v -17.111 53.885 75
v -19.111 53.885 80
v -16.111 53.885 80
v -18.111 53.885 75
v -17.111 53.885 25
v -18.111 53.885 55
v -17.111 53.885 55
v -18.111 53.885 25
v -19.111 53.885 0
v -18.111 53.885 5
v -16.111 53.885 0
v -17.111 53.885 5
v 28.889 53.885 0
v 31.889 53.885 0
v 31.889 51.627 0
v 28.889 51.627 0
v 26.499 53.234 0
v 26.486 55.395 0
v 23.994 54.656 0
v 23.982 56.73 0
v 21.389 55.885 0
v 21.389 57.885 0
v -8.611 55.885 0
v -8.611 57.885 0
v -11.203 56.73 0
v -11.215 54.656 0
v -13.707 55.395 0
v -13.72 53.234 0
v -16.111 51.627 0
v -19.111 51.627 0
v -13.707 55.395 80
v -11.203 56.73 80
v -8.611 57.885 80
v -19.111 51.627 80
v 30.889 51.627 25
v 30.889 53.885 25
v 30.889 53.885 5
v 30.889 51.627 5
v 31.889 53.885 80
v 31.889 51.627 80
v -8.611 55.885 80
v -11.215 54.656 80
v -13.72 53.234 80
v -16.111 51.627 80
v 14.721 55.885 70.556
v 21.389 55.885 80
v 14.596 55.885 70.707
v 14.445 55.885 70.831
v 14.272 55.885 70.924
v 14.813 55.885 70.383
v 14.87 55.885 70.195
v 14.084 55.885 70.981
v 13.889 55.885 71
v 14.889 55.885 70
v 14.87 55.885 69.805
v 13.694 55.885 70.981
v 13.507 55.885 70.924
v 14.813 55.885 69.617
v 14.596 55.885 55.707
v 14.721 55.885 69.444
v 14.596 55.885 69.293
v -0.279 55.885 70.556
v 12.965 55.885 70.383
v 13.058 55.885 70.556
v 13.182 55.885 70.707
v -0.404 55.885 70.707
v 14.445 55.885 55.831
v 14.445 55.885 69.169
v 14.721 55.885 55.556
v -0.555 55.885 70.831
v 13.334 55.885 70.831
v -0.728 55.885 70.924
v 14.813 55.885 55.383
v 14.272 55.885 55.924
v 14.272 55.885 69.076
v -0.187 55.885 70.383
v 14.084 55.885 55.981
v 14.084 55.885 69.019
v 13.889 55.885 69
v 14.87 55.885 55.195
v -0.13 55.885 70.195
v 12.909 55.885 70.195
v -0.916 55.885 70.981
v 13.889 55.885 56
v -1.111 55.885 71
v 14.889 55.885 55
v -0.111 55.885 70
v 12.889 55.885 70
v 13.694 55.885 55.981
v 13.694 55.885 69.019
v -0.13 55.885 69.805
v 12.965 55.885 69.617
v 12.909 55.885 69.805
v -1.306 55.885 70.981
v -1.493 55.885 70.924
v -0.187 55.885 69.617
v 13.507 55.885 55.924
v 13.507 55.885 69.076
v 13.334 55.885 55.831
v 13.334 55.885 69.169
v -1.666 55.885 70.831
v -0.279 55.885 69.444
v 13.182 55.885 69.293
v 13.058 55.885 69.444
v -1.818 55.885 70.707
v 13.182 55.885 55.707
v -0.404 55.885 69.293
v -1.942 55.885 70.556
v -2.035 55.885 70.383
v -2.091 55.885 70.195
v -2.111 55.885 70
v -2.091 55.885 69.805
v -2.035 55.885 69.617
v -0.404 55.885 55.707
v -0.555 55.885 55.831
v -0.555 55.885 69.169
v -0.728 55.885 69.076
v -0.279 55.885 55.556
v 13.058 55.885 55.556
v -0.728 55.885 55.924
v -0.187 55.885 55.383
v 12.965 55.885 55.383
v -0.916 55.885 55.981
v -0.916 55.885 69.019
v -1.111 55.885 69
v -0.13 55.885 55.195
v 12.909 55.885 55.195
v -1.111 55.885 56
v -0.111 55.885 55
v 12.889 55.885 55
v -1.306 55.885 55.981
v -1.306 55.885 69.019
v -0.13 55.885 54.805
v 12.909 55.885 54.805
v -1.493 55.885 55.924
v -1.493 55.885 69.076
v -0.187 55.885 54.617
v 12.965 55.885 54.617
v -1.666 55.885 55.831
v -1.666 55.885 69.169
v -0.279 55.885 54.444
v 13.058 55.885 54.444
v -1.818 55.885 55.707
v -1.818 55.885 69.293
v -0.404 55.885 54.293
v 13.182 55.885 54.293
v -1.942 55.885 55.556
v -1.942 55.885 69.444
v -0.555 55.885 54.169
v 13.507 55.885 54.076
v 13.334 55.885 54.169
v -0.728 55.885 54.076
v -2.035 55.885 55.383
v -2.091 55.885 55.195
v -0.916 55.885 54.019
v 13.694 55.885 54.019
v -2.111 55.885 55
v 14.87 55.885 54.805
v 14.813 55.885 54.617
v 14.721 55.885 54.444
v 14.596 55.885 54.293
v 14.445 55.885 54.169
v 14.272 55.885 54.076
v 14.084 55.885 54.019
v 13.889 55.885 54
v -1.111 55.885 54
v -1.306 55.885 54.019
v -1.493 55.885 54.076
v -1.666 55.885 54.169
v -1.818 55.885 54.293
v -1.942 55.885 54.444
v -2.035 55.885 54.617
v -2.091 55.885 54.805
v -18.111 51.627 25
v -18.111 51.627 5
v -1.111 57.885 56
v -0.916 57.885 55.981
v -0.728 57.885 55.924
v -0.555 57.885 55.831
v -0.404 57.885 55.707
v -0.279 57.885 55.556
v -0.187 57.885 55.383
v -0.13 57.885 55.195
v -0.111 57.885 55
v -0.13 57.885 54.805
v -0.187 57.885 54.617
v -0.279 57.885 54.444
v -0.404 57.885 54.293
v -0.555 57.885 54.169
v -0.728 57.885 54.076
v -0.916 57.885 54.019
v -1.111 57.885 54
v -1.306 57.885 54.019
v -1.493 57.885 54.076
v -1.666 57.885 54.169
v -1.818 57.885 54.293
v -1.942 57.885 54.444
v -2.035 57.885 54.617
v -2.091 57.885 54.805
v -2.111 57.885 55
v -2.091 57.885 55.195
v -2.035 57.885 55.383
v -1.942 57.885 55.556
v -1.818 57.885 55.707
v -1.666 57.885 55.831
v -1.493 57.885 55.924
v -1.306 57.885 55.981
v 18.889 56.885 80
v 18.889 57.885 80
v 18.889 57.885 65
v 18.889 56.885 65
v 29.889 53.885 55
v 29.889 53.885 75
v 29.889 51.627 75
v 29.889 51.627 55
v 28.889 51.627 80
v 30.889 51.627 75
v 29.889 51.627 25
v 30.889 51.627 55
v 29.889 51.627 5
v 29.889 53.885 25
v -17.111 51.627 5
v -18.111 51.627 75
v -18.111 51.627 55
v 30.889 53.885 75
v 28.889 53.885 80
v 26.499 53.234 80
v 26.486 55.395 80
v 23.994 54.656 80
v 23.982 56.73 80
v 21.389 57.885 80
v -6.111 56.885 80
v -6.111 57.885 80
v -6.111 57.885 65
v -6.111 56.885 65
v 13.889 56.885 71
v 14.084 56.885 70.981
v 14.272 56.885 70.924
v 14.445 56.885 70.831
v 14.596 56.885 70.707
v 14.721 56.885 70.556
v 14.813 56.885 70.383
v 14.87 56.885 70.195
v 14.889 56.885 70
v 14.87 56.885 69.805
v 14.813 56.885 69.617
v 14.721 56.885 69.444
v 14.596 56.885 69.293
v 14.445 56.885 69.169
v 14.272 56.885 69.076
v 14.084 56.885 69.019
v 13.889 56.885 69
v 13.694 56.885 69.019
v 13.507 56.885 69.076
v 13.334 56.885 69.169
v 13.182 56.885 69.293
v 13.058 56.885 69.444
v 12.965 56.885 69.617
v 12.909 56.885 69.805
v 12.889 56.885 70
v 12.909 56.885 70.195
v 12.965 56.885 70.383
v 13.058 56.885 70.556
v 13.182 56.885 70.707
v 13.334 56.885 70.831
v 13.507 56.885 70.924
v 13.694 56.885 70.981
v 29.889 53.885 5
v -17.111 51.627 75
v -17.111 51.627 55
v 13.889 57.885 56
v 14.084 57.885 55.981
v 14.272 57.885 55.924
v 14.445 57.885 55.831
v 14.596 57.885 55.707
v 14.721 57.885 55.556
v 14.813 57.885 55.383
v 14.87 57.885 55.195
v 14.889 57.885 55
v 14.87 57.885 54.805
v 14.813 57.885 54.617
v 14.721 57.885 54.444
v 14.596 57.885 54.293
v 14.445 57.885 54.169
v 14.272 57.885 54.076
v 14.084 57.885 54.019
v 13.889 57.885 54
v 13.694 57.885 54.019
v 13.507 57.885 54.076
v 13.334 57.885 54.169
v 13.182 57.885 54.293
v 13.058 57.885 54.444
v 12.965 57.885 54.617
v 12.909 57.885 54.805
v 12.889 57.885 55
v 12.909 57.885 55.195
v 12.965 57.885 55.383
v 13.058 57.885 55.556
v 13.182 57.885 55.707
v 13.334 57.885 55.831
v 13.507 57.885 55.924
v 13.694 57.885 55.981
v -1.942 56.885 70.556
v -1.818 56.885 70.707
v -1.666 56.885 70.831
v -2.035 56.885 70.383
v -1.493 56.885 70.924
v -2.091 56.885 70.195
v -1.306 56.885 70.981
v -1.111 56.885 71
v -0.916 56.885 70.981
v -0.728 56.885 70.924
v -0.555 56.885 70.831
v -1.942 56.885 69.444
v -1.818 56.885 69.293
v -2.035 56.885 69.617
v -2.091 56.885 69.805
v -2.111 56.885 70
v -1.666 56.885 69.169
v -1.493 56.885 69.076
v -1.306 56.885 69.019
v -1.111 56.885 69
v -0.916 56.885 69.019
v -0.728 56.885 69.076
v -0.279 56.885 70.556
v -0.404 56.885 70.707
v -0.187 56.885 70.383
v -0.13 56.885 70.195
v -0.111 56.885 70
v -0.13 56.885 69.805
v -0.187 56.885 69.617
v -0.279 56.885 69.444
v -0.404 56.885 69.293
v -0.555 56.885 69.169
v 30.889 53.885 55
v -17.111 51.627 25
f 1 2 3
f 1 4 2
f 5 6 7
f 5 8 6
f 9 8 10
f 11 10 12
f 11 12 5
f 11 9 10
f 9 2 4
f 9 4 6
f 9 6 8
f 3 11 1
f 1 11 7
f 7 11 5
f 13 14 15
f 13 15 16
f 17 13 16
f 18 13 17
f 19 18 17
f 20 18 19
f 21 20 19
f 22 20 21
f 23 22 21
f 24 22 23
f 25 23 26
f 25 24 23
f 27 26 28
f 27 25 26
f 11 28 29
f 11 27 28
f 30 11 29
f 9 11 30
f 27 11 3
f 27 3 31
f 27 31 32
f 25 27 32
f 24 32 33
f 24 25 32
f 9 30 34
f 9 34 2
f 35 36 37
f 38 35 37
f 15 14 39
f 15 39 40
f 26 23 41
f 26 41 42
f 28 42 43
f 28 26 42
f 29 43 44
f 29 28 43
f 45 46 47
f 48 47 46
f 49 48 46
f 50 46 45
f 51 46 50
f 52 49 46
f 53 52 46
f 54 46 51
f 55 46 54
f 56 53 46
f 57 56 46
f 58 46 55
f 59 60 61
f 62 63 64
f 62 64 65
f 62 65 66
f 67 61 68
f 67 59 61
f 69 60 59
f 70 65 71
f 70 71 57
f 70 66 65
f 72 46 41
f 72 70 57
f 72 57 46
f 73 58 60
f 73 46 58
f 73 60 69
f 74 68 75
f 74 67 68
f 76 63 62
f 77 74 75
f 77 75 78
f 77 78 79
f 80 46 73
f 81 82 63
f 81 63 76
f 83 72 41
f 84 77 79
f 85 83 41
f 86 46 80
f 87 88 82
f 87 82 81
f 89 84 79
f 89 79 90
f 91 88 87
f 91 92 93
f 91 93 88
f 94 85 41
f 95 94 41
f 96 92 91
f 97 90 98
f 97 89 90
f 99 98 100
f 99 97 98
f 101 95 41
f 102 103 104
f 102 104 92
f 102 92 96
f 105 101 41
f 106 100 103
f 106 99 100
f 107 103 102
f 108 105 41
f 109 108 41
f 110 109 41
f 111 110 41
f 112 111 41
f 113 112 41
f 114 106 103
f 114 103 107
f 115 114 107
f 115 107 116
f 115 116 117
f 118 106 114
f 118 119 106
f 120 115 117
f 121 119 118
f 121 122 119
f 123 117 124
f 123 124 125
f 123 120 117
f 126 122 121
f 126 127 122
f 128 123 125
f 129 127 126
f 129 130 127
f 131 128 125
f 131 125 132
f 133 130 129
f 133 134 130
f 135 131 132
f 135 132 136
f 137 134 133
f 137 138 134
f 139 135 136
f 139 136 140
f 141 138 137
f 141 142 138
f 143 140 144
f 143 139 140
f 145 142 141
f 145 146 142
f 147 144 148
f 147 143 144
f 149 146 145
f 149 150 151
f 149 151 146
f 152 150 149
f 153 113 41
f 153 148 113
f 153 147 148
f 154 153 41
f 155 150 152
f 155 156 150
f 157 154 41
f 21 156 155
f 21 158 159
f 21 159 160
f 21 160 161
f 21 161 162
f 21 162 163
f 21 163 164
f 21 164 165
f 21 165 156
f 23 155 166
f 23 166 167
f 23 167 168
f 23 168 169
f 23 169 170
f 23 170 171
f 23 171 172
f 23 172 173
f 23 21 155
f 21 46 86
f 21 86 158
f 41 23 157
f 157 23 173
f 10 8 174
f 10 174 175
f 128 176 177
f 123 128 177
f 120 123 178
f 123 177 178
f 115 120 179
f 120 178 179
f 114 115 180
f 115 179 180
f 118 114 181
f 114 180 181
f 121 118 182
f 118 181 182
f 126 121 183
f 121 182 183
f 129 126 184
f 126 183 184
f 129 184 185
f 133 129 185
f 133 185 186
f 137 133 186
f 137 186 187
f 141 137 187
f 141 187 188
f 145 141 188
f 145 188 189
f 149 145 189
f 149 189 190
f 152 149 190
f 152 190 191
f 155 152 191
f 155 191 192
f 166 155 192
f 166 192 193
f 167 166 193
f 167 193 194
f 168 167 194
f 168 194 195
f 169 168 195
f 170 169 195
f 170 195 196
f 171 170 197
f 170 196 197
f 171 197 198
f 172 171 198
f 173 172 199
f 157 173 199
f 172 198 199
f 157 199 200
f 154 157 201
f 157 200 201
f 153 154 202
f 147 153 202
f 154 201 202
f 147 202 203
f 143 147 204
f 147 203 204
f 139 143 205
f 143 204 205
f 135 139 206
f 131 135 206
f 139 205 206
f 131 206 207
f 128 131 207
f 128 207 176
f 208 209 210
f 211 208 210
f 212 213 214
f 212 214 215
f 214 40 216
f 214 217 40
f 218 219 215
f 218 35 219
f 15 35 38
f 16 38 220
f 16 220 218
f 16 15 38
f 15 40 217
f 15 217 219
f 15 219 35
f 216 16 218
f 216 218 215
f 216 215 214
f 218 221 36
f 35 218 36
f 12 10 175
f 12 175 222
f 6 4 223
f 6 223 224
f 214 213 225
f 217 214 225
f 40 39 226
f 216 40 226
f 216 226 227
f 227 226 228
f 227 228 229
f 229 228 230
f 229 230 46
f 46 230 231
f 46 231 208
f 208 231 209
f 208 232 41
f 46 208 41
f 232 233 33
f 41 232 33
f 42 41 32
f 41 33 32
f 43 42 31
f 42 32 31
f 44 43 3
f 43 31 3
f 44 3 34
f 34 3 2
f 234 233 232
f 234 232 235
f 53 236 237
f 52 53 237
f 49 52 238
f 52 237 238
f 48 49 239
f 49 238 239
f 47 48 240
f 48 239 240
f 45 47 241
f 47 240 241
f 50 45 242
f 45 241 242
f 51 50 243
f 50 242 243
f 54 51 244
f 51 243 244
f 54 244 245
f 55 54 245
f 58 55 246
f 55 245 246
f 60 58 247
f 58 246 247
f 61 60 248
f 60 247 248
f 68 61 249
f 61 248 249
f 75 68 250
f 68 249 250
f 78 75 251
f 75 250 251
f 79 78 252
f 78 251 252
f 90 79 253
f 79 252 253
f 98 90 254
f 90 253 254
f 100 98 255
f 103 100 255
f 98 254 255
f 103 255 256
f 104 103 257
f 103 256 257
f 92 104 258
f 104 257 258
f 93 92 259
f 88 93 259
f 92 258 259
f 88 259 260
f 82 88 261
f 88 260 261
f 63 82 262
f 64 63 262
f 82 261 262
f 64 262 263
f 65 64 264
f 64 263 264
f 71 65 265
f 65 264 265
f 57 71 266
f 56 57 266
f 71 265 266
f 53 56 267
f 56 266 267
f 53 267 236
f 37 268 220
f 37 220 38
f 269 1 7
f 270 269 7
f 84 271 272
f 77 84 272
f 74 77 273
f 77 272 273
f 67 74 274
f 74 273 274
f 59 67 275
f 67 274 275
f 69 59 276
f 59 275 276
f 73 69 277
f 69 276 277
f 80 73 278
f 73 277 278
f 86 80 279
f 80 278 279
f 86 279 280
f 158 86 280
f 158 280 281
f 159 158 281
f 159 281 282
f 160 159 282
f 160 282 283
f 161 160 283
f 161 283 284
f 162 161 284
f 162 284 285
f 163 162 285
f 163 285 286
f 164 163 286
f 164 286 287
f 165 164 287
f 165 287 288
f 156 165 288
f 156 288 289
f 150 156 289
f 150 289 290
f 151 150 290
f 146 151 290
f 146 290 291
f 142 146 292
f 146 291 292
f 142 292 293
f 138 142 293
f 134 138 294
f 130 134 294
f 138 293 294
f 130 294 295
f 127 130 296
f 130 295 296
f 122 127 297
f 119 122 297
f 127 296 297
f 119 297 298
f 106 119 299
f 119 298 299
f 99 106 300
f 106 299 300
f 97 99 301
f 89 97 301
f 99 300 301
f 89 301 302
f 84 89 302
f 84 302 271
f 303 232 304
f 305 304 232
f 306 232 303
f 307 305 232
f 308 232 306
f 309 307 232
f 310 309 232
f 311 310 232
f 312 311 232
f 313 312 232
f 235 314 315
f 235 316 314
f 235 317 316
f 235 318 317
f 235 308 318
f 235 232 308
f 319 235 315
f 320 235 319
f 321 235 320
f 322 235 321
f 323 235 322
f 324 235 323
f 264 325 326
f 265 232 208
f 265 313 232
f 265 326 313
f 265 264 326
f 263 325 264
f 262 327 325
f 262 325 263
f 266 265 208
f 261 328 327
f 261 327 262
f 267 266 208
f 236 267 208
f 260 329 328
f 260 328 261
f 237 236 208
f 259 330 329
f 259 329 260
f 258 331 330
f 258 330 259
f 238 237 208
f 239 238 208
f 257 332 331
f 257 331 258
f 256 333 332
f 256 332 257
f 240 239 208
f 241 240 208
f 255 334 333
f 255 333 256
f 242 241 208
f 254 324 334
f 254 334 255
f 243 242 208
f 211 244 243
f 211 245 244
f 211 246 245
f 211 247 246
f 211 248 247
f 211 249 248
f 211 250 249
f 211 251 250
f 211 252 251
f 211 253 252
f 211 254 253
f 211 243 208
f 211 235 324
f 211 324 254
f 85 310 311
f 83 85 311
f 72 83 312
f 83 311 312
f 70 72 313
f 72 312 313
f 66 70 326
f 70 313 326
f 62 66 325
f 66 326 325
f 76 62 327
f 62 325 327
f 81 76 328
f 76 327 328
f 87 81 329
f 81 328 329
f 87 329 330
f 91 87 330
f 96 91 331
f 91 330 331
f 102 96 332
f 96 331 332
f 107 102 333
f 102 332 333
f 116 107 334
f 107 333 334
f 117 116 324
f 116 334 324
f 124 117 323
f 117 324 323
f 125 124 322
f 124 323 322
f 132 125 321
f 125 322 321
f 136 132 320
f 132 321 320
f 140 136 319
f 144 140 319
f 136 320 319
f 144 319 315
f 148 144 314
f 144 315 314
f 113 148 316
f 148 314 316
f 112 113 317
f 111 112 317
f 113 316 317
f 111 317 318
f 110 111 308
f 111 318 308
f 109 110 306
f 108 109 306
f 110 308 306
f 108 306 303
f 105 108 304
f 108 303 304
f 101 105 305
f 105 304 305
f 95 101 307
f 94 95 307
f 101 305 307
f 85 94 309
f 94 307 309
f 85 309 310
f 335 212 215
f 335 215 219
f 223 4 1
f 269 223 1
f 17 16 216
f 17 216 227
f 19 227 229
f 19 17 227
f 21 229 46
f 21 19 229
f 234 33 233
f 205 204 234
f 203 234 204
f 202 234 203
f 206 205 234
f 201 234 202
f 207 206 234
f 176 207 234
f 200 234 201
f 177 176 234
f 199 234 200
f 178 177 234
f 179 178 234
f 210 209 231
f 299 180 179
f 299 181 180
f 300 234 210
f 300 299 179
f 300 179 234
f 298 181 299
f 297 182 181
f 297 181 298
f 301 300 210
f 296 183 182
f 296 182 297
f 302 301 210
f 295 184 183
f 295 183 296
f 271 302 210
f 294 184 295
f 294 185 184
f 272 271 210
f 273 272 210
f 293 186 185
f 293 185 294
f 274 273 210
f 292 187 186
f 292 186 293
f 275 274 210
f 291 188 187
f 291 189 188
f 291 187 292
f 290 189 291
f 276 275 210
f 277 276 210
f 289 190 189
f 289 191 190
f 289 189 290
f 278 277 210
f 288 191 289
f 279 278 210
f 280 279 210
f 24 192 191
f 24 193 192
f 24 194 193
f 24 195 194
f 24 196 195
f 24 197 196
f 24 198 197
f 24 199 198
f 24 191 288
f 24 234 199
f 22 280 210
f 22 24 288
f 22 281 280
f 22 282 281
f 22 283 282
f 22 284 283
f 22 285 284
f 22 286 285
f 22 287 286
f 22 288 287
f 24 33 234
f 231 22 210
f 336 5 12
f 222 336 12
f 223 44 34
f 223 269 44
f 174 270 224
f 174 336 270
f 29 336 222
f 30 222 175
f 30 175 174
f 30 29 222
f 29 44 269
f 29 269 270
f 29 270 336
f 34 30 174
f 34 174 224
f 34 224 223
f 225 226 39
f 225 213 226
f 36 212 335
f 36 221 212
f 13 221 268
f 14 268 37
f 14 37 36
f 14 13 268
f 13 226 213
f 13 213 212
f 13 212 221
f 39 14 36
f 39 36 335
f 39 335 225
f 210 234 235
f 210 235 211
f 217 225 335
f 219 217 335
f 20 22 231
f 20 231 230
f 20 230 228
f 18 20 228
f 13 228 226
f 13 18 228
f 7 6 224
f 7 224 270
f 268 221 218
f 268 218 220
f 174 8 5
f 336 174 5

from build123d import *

# Parameters (mm, degrees)
BOSS_EXTRUDE1_DEPTH = 80
SKETCH8_W           = 25
SKETCH8_H           = 15
CUT_EXTRUDE2_DEPTH  = 1
SKETCH9_R           = 1
CUT_EXTRUDE3_DEPTH  = 1
SKETCH12_W          = 1
SKETCH12_H          = 20
CUT_EXTRUDE4_DEPTH  = 4.69
SKETCH13_R          = 1
CUT_EXTRUDE5_DEPTH  = 4.69


with BuildPart() as part:
    # Sketch4 → Boss-Extrude1 (new body)
    with BuildSketch(Plane.XY):
        with BuildLine():
            Line((-19.110677356, 53.885203774), (-16.110677356, 53.885203774))
            ThreePointArc((-16.110677356, 53.885203774), (-12.467042329, 56.084638099), (-8.610677356, 57.885203774))
            Line((-8.610677356, 57.885203774), (21.389322644, 57.885203774))
            ThreePointArc((21.389322644, 57.885203774), (25.245687617, 56.084638099), (28.889322644, 53.885203774))
            Line((28.889322644, 53.885203774), (31.889322644, 53.885203774))
            Line((31.889322644, 53.885203774), (31.889322644, 51.627366583))
            Line((31.889322644, 51.627366583), (28.889322644, 51.627366583))
            ThreePointArc((28.889322644, 51.627366583), (25.259796787, 53.968495283), (21.389322644, 55.885203774))
            Line((21.389322644, 55.885203774), (-8.610677356, 55.885203774))
            ThreePointArc((-8.610677356, 55.885203774), (-12.481151499, 53.968495283), (-16.110677356, 51.627366583))
            Line((-16.110677356, 51.627366583), (-19.110677356, 51.627366583))
            Line((-19.110677356, 51.627366583), (-19.110677356, 53.885203774))
        make_face()
    extrude(amount=BOSS_EXTRUDE1_DEPTH)

    # Sketch8 → Cut-Extrude2 (cut)
    with BuildSketch(Plane(origin=(0, 57.885203774, 0), x_dir=(1, 0, 0), z_dir=(0, 1, 0))):
        with Locations((6.389322644, -72.5)):
            Rectangle(SKETCH8_W, SKETCH8_H)
    extrude(amount=-CUT_EXTRUDE2_DEPTH, mode=Mode.SUBTRACT)

    # Sketch9 → Cut-Extrude3 (cut)
    with BuildSketch(Plane(origin=(0, 56.885203774, 0), x_dir=(1, 0, 0), z_dir=(0, 1, 0))):
        with Locations(Location((-1.110677356, -70, 0), (0, 0, 270))):
            Circle(SKETCH9_R)
        with Locations(Location((13.889322644, -70, 0), (0, 0, 270))):
            Circle(SKETCH9_R)
    extrude(amount=-CUT_EXTRUDE3_DEPTH, mode=Mode.SUBTRACT)

    # Sketch12 → Cut-Extrude4 (cut)
    with BuildSketch(Plane(origin=(0, 53.885203774, 0), x_dir=(1, 0, 0), z_dir=(0, 1, 0))):
        with Locations((-17.610677356, -15)):
            Rectangle(SKETCH12_W, SKETCH12_H)
        with Locations((-17.610677356, -65)):
            Rectangle(SKETCH12_W, SKETCH12_H)
        with Locations((30.389322644, -15)):
            Rectangle(SKETCH12_W, SKETCH12_H)
        with Locations((30.389322644, -65)):
            Rectangle(SKETCH12_W, SKETCH12_H)
    extrude(amount=-CUT_EXTRUDE4_DEPTH, mode=Mode.SUBTRACT)

    # Sketch13 → Cut-Extrude5 (cut)
    with BuildSketch(Plane(origin=(0, 57.885203774, 0), x_dir=(1, 0, 0), z_dir=(0, 1, 0))):
        with Locations(Location((-1.110677356, -55, 0), (0, 0, 270))):
            Circle(SKETCH13_R)
        with Locations(Location((13.889322644, -55, 0), (0, 0, 270))):
            Circle(SKETCH13_R)
    extrude(amount=-CUT_EXTRUDE5_DEPTH, mode=Mode.SUBTRACT)


solid = part.part
